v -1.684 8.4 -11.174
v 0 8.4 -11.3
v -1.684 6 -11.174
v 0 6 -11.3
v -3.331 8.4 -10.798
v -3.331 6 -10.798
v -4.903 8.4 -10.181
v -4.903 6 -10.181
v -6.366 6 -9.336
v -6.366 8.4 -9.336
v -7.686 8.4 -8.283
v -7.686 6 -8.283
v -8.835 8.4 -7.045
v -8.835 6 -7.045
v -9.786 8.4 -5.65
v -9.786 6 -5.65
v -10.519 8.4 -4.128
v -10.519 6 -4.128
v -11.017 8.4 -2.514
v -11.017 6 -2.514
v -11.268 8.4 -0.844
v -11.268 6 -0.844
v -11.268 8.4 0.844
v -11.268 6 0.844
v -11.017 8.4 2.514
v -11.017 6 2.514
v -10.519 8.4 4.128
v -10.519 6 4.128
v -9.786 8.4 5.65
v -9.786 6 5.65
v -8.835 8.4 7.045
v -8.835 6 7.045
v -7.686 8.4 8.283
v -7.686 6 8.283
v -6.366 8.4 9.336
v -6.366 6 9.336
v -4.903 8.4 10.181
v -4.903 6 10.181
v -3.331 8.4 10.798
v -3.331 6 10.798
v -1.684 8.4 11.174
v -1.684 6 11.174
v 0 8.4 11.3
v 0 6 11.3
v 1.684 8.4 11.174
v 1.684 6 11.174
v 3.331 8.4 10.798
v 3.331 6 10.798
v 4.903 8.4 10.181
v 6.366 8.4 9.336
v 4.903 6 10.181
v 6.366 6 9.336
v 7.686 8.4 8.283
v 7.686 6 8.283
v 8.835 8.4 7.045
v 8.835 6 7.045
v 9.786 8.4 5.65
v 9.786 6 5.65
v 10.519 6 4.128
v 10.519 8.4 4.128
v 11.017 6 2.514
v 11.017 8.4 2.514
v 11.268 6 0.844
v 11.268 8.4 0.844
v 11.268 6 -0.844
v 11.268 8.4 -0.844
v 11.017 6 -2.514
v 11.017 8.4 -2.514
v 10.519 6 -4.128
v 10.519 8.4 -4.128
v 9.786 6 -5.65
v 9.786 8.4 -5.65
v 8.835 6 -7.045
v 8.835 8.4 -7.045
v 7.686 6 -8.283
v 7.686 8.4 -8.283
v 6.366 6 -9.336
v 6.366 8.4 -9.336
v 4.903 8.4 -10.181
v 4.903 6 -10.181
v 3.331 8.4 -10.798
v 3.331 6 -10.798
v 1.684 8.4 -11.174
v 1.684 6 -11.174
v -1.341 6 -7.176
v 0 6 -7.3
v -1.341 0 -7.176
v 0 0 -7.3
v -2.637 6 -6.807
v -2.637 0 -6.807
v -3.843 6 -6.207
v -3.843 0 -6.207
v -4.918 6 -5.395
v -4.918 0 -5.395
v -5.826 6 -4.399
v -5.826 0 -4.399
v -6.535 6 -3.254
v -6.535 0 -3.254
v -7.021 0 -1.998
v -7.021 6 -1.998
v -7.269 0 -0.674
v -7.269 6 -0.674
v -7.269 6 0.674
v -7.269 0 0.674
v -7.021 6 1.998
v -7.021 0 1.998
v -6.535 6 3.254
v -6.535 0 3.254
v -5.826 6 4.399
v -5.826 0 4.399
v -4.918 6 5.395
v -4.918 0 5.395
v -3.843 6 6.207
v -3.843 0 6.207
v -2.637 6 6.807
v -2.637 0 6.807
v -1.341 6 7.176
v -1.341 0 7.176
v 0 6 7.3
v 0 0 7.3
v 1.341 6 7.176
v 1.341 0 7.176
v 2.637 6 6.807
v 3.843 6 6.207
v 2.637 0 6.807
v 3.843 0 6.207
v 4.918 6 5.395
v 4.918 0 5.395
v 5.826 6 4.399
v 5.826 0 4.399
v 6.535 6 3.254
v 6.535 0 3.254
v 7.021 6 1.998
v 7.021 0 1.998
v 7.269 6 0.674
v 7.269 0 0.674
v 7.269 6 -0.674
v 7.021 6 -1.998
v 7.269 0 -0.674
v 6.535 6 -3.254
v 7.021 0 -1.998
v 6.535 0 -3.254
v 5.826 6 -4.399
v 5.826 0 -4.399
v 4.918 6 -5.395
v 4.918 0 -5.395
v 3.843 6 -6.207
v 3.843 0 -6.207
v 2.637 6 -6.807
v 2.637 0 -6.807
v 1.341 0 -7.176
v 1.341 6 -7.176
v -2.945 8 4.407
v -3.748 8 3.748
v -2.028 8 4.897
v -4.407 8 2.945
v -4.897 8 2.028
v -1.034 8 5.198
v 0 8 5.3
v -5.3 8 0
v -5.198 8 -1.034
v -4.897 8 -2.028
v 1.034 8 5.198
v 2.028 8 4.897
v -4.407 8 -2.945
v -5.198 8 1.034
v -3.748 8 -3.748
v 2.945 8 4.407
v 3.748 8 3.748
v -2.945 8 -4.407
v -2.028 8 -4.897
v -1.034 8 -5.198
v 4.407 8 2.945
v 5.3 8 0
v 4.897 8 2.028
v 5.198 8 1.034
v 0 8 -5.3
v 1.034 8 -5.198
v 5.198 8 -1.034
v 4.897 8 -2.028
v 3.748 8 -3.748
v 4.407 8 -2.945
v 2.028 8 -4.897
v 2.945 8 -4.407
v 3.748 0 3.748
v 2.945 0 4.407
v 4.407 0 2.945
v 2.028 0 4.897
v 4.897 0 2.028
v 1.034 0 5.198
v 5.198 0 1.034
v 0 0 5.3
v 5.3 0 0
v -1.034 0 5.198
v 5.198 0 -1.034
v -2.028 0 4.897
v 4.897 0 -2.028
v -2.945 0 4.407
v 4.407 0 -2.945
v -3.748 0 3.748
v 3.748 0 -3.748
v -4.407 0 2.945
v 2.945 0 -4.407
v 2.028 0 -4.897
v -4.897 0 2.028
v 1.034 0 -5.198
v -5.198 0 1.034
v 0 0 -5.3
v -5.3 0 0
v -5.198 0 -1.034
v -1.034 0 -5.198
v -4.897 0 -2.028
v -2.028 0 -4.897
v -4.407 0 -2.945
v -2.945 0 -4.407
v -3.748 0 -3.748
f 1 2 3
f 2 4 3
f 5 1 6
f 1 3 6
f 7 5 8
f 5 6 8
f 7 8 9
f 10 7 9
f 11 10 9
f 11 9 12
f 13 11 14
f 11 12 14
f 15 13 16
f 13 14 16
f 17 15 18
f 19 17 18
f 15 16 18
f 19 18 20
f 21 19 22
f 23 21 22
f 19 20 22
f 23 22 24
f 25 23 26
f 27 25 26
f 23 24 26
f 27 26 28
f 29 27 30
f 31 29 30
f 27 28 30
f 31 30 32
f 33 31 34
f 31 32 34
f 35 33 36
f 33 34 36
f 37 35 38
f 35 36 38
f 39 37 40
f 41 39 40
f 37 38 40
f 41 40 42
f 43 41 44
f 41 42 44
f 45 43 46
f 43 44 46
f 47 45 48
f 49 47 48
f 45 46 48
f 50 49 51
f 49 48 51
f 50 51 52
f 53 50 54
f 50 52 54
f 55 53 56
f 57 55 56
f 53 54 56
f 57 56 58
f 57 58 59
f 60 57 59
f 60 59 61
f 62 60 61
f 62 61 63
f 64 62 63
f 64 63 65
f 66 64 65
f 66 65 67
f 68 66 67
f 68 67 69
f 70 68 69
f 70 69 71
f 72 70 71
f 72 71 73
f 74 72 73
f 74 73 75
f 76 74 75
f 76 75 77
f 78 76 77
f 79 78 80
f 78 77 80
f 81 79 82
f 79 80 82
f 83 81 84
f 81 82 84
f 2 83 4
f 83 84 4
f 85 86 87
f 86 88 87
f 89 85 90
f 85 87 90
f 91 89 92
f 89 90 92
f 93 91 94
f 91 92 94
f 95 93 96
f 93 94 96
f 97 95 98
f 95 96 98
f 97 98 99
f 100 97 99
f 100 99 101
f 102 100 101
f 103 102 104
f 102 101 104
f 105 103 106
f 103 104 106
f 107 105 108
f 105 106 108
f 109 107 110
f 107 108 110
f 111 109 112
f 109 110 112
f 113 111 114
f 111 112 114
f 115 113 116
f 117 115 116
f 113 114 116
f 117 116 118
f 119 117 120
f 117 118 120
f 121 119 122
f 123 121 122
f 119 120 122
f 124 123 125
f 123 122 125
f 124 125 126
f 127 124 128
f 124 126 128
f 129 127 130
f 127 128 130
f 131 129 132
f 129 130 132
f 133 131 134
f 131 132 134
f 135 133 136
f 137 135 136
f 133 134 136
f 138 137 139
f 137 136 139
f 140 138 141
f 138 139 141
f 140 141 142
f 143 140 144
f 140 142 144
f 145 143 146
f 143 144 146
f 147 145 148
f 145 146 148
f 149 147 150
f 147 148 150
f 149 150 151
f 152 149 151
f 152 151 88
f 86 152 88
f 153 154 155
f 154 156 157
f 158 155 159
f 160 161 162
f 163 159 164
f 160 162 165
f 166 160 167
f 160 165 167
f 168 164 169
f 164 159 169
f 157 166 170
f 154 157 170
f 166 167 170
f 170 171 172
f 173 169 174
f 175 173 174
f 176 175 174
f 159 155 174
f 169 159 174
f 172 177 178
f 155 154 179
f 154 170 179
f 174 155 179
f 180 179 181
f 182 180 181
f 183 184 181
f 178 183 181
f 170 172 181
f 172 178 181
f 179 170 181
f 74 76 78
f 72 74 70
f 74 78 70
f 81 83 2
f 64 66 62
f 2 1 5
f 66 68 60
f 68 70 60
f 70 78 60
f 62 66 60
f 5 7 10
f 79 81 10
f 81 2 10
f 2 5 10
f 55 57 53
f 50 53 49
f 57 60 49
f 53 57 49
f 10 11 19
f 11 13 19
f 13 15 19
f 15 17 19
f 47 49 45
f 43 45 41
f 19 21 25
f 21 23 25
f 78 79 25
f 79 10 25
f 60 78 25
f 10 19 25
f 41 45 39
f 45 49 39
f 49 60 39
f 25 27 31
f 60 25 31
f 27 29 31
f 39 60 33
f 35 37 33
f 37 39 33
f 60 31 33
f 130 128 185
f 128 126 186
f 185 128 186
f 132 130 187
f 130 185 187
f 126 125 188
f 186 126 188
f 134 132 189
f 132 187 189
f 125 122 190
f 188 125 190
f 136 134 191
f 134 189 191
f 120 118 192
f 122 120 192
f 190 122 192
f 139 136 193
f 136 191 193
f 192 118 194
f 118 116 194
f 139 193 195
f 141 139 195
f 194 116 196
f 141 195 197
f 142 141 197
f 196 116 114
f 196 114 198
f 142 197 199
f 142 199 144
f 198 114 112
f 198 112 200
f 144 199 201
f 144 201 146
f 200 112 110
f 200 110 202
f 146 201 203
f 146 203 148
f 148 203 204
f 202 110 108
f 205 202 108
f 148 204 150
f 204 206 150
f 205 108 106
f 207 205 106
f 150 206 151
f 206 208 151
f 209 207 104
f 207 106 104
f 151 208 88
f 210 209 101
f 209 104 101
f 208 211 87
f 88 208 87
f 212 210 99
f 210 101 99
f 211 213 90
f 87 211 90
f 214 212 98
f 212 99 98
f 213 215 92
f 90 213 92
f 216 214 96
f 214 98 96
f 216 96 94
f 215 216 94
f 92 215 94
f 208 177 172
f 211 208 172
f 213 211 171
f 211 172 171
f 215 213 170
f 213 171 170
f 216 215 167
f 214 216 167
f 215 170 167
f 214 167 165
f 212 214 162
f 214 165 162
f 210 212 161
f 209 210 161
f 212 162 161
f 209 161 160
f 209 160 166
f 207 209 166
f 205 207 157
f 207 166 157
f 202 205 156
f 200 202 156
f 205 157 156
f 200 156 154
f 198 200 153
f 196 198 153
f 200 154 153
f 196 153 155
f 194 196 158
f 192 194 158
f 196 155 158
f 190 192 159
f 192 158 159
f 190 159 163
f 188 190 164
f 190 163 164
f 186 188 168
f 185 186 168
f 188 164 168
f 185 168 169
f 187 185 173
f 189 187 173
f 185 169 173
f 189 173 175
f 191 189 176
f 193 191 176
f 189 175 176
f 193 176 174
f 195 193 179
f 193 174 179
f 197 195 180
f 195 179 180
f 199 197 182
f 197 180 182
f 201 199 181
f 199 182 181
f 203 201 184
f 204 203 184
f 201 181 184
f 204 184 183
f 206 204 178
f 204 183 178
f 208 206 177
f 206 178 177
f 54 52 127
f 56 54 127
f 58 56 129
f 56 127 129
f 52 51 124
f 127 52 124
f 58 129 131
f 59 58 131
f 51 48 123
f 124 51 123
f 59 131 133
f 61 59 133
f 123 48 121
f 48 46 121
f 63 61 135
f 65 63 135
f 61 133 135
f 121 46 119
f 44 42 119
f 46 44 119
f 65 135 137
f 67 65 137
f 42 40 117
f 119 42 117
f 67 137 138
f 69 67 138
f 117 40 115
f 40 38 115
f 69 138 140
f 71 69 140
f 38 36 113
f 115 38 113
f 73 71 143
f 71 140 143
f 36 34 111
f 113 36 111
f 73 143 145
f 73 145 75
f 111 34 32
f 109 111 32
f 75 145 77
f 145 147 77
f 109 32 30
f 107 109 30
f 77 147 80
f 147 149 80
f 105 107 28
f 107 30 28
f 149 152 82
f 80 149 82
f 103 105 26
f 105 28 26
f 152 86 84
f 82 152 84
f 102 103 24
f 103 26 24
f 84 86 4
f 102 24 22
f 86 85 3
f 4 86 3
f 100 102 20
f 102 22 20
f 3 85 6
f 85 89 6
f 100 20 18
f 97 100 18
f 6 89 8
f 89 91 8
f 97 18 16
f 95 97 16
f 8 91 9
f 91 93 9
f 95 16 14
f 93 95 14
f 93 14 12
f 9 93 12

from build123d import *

# Parameters (mm, degrees)
SKETCH_2_R      = 5.589622462
EXTRUDE_1_DEPTH = 0.4


with BuildPart() as part:
    # Эскиз1 → Повернуть1 (revolve)
    with BuildSketch(Plane.XY, mode=Mode.PRIVATE) as revolve_1_sk:
        Polygon((5.3, 0), (5.3, 8.4), (11.3, 8.4), (11.3, 6), (7.3, 6), (7.3, 0), align=None)
    revolve(revolve_1_sk.sketch.rotate(Axis((0, 0, 0), (0, 1, 0)), 90), axis=Axis((0, 0, 0), (0, 1, 0)))

    # Эскиз2 → Бобышка-Вытянуть1 (add)
    with BuildSketch(Plane(origin=(0, 8.4, 0), x_dir=(1, 0, 0), z_dir=(0, 1, 0))):
        Circle(SKETCH_2_R)
    extrude(amount=-EXTRUDE_1_DEPTH)


solid = part.part
